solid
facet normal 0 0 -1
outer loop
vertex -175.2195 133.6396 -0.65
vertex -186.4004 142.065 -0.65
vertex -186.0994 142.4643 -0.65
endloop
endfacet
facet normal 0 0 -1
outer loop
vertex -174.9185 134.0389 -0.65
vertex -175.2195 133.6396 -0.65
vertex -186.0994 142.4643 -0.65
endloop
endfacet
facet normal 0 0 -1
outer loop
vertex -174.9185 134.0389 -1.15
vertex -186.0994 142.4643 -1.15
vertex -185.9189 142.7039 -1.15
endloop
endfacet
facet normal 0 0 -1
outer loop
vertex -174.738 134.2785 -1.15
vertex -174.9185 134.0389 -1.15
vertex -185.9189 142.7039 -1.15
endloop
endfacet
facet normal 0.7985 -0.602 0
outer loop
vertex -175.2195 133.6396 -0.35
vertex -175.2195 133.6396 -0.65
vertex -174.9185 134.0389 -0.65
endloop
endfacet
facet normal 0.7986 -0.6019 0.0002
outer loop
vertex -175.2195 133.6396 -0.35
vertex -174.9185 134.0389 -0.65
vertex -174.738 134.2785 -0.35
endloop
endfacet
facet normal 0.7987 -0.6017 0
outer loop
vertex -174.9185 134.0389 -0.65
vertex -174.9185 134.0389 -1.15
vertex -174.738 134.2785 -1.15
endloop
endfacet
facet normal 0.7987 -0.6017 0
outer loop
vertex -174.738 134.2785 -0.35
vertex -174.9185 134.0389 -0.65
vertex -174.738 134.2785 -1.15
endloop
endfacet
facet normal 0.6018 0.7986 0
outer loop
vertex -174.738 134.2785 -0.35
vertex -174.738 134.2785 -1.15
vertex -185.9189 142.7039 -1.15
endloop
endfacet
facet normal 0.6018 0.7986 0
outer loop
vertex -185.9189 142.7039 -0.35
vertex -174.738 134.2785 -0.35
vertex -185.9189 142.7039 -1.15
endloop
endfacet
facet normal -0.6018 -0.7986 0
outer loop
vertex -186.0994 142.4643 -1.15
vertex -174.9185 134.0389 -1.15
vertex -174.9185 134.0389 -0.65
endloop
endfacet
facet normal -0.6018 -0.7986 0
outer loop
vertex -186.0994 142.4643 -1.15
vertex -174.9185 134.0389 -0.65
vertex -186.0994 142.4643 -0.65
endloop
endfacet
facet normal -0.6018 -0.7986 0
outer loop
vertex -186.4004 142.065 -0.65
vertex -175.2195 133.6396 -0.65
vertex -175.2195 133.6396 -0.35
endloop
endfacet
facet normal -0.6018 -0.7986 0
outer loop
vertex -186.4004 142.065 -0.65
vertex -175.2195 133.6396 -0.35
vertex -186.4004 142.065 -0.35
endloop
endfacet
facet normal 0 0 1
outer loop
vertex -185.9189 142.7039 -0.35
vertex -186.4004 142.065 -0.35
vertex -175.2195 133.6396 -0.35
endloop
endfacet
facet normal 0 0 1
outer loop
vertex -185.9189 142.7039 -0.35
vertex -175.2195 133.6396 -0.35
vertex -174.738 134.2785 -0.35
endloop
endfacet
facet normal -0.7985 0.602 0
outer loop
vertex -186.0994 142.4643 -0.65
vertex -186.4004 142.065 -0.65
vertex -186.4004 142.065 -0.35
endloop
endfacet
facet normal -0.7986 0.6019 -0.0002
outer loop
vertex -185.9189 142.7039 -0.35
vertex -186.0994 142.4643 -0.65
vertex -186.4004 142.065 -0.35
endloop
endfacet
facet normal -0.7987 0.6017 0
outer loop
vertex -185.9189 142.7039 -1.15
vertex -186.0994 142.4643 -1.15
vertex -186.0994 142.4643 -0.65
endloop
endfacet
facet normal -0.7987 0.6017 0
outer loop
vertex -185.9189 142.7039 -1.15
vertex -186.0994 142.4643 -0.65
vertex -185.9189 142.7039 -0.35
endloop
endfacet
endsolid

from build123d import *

# Parameters (mm, degrees)
BOX127_W               = 0.8
BOX127_H               = 14
BOX127_DEPTH           = 0.8
BOX128_W               = 0.8
BOX128_H               = 14
BOX128_DEPTH           = 0.8
CUT067_PLACEMENT_ANGLE = 53


with BuildPart() as cubo127:
    # Box127 → Box127 (new body)
    with BuildSketch(Plane.XY):
        with Locations((0.4, 7)):
            Rectangle(BOX127_W, BOX127_H)
    extrude(amount=BOX127_DEPTH)


with BuildPart() as perfil_l_2da_cara009:
    # Box128 → Box128 (new body)
    with BuildSketch(Plane(origin=(0.3, 0, 0.3), x_dir=(1, 0, 0), z_dir=(0, 0, 1))):
        with Locations((0.4, 7)):
            Rectangle(BOX128_W, BOX128_H)
    extrude(amount=BOX128_DEPTH)

    # Cut067: cut Cubo127
    add(cubo127.part, mode=Mode.SUBTRACT)


with BuildPart() as perfil_l_2da_cara009_1:
    # Cut067 placement: moved
    add(perfil_l_2da_cara009.part.moved(Location((-175.4, 133.4, -1.45))).rotate(Axis((-175.4, 133.4, -1.45), (0, 0, 1)), CUT067_PLACEMENT_ANGLE))


solid = perfil_l_2da_cara009_1.part
